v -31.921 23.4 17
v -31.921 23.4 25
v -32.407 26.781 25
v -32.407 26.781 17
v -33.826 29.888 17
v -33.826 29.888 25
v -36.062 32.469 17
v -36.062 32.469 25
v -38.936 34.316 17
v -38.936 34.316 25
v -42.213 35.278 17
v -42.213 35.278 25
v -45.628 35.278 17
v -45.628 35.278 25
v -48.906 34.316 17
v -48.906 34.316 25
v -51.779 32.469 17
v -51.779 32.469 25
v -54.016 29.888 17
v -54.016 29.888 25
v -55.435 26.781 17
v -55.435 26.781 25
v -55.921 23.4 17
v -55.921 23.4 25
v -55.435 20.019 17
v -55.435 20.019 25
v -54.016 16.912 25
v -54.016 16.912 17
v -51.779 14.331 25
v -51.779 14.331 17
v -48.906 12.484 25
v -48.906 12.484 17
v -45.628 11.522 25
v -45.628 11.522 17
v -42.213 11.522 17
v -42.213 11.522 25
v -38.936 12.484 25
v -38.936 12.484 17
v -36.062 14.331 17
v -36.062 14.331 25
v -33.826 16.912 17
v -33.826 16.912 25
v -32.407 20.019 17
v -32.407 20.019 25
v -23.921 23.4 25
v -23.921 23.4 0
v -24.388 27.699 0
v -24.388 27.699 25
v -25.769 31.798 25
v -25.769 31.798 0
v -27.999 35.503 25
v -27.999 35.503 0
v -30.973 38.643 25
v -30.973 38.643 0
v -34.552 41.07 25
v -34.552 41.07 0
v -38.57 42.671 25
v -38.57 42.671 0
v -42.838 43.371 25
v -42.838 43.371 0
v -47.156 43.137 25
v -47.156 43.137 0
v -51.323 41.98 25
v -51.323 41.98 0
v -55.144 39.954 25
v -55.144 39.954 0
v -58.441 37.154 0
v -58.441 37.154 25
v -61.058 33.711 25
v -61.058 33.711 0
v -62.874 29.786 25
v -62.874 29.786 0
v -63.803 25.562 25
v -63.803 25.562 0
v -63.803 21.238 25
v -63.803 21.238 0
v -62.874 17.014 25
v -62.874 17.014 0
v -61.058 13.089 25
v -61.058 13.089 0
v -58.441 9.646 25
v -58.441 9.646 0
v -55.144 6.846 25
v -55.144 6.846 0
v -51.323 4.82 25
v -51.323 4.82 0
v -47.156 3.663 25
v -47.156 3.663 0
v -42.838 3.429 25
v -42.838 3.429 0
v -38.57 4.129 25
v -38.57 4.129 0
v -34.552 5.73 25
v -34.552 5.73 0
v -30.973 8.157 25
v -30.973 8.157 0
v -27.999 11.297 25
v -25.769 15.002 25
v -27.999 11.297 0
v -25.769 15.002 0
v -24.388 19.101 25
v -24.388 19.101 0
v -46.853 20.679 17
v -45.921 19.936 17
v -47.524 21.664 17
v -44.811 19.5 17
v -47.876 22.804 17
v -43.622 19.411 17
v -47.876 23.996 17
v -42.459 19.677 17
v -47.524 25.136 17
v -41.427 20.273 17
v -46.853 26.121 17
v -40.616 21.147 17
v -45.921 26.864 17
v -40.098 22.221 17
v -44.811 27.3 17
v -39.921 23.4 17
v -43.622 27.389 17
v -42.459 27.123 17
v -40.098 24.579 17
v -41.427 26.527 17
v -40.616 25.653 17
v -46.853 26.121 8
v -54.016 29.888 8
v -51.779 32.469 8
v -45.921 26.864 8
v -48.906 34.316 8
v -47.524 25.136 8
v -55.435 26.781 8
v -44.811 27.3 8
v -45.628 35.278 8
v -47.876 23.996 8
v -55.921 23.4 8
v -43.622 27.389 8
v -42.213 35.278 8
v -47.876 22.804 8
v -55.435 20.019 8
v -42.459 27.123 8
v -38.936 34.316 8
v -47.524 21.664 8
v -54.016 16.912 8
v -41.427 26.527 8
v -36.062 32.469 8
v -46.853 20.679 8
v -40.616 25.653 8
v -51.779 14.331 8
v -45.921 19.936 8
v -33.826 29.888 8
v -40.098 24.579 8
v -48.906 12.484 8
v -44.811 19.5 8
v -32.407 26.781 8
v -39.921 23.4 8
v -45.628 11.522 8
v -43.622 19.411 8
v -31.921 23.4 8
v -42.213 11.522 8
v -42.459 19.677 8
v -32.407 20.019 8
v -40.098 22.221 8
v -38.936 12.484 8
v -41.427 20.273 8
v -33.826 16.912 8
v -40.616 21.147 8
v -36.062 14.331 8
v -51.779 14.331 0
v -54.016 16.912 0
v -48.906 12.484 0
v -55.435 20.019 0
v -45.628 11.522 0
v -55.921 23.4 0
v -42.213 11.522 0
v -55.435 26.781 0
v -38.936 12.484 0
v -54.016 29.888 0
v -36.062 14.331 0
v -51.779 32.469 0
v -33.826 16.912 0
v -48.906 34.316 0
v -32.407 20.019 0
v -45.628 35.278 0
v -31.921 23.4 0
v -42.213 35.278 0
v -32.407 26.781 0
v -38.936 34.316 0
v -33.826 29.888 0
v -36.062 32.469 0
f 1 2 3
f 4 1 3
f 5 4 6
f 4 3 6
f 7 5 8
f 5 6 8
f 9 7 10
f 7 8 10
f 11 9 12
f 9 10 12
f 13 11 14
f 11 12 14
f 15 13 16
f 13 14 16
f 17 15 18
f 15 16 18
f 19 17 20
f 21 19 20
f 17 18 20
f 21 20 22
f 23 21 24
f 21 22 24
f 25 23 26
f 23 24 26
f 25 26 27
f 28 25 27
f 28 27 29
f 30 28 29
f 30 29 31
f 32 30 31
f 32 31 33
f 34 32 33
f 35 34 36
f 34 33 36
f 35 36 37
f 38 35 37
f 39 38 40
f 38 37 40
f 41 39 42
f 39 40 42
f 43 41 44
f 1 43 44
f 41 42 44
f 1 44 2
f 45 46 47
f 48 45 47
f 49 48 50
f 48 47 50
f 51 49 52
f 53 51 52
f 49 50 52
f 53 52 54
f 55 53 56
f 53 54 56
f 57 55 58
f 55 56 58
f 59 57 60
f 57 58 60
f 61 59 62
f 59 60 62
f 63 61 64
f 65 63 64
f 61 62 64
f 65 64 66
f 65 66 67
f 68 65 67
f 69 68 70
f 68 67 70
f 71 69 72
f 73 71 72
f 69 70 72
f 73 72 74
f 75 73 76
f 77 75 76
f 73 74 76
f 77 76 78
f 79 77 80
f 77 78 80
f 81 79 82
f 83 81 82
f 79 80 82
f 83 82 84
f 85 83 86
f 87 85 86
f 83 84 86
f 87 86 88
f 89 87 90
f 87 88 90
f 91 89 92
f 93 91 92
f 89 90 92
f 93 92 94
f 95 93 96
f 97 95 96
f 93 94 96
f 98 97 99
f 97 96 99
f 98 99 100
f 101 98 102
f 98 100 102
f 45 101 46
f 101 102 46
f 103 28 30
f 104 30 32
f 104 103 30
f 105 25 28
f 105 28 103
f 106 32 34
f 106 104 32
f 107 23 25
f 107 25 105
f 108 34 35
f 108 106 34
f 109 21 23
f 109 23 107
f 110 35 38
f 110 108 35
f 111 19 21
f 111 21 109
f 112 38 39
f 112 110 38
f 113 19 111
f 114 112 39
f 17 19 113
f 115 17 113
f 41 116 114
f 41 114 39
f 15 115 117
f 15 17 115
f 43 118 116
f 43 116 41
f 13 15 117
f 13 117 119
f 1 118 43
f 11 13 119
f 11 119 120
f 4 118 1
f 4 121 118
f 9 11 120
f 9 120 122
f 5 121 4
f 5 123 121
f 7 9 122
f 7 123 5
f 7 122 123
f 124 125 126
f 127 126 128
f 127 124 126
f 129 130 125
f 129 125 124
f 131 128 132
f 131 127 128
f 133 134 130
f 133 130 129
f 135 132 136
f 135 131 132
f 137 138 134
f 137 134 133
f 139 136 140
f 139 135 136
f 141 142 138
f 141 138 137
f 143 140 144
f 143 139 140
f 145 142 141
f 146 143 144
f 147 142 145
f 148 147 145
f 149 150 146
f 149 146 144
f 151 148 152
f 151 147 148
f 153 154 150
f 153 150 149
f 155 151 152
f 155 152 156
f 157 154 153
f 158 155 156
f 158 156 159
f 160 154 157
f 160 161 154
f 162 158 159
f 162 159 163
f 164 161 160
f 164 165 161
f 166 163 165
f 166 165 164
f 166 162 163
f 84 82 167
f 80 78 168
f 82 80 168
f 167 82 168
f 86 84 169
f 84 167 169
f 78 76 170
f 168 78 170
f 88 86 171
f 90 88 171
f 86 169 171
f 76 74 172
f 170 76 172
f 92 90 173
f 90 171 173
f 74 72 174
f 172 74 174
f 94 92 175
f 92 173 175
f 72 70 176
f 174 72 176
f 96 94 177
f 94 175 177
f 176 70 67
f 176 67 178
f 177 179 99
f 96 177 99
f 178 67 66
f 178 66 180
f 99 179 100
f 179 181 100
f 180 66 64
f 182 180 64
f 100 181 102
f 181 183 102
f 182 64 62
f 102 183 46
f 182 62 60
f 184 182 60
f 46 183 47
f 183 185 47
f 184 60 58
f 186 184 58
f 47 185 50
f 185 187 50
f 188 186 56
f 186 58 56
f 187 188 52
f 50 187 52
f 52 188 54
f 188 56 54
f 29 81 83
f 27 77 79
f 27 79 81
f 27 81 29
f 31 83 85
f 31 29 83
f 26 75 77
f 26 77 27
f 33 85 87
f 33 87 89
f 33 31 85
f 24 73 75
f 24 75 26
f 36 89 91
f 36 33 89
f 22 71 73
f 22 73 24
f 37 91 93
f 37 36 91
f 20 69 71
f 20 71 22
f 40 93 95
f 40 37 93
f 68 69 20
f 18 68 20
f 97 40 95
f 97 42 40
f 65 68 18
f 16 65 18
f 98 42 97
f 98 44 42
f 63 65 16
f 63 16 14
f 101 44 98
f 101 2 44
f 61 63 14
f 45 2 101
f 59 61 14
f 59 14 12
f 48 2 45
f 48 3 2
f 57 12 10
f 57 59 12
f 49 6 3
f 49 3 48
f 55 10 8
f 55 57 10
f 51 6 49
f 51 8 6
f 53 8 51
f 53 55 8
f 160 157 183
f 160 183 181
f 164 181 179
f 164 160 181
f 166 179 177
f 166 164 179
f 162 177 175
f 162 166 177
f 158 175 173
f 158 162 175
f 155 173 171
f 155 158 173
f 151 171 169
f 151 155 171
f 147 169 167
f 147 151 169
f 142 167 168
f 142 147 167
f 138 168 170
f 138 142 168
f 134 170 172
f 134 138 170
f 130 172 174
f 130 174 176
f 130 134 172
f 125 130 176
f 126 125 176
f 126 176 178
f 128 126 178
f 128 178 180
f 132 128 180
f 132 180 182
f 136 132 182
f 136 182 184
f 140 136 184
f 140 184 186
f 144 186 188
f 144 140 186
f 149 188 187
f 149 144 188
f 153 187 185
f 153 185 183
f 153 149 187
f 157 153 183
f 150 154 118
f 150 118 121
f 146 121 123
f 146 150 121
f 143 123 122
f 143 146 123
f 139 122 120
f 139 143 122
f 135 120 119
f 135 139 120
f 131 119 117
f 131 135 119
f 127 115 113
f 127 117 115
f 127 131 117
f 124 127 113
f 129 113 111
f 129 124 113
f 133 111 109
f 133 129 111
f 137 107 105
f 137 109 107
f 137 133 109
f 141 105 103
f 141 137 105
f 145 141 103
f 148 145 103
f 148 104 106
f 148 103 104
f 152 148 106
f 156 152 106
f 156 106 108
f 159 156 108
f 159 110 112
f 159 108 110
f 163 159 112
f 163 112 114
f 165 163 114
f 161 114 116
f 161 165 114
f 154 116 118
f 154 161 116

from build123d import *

# Parameters (mm, degrees)
SKETCH_1_R          = 20
SKETCH_1_R_2        = 4
EXTRUDE_1_DEPTH     = 25
SKETCH_2_R          = 12
CUT_EXTRUDE_1_DEPTH = 8
CUT_EXTRUDE_START   = -8
SKETCH_3_R          = 12
CUT_EXTRUDE_2_DEPTH = 8


with BuildPart() as part:
    # 草图1 → 凸台-拉伸1 (new body)
    with BuildSketch(Plane.XY):
        with Locations((-43.920622876, 23.400003441)):
            Circle(SKETCH_1_R)
        with Locations((-43.920622876, 23.400003441)):
            Circle(SKETCH_1_R_2, mode=Mode.SUBTRACT)
    extrude(amount=EXTRUDE_1_DEPTH)

    # 草图2 → 切除-拉伸1 (cut)
    with BuildSketch(Plane.XY.offset(25)):
        with Locations((-43.920622876, 23.400003441)):
            Circle(SKETCH_2_R)
    extrude(amount=-CUT_EXTRUDE_1_DEPTH, mode=Mode.SUBTRACT)

    # 草图3 → 切除-拉伸2 (cut)
    with BuildSketch(Plane(origin=(0, 0, 0), x_dir=(-1, 0, 0), z_dir=(0, 0, -1)).offset(CUT_EXTRUDE_START)):
        with Locations(Location((43.920622876, 23.400003441, 0), (0, 0, 180))):
            Circle(SKETCH_3_R)
    extrude(amount=CUT_EXTRUDE_2_DEPTH, mode=Mode.SUBTRACT)


solid = part.part
